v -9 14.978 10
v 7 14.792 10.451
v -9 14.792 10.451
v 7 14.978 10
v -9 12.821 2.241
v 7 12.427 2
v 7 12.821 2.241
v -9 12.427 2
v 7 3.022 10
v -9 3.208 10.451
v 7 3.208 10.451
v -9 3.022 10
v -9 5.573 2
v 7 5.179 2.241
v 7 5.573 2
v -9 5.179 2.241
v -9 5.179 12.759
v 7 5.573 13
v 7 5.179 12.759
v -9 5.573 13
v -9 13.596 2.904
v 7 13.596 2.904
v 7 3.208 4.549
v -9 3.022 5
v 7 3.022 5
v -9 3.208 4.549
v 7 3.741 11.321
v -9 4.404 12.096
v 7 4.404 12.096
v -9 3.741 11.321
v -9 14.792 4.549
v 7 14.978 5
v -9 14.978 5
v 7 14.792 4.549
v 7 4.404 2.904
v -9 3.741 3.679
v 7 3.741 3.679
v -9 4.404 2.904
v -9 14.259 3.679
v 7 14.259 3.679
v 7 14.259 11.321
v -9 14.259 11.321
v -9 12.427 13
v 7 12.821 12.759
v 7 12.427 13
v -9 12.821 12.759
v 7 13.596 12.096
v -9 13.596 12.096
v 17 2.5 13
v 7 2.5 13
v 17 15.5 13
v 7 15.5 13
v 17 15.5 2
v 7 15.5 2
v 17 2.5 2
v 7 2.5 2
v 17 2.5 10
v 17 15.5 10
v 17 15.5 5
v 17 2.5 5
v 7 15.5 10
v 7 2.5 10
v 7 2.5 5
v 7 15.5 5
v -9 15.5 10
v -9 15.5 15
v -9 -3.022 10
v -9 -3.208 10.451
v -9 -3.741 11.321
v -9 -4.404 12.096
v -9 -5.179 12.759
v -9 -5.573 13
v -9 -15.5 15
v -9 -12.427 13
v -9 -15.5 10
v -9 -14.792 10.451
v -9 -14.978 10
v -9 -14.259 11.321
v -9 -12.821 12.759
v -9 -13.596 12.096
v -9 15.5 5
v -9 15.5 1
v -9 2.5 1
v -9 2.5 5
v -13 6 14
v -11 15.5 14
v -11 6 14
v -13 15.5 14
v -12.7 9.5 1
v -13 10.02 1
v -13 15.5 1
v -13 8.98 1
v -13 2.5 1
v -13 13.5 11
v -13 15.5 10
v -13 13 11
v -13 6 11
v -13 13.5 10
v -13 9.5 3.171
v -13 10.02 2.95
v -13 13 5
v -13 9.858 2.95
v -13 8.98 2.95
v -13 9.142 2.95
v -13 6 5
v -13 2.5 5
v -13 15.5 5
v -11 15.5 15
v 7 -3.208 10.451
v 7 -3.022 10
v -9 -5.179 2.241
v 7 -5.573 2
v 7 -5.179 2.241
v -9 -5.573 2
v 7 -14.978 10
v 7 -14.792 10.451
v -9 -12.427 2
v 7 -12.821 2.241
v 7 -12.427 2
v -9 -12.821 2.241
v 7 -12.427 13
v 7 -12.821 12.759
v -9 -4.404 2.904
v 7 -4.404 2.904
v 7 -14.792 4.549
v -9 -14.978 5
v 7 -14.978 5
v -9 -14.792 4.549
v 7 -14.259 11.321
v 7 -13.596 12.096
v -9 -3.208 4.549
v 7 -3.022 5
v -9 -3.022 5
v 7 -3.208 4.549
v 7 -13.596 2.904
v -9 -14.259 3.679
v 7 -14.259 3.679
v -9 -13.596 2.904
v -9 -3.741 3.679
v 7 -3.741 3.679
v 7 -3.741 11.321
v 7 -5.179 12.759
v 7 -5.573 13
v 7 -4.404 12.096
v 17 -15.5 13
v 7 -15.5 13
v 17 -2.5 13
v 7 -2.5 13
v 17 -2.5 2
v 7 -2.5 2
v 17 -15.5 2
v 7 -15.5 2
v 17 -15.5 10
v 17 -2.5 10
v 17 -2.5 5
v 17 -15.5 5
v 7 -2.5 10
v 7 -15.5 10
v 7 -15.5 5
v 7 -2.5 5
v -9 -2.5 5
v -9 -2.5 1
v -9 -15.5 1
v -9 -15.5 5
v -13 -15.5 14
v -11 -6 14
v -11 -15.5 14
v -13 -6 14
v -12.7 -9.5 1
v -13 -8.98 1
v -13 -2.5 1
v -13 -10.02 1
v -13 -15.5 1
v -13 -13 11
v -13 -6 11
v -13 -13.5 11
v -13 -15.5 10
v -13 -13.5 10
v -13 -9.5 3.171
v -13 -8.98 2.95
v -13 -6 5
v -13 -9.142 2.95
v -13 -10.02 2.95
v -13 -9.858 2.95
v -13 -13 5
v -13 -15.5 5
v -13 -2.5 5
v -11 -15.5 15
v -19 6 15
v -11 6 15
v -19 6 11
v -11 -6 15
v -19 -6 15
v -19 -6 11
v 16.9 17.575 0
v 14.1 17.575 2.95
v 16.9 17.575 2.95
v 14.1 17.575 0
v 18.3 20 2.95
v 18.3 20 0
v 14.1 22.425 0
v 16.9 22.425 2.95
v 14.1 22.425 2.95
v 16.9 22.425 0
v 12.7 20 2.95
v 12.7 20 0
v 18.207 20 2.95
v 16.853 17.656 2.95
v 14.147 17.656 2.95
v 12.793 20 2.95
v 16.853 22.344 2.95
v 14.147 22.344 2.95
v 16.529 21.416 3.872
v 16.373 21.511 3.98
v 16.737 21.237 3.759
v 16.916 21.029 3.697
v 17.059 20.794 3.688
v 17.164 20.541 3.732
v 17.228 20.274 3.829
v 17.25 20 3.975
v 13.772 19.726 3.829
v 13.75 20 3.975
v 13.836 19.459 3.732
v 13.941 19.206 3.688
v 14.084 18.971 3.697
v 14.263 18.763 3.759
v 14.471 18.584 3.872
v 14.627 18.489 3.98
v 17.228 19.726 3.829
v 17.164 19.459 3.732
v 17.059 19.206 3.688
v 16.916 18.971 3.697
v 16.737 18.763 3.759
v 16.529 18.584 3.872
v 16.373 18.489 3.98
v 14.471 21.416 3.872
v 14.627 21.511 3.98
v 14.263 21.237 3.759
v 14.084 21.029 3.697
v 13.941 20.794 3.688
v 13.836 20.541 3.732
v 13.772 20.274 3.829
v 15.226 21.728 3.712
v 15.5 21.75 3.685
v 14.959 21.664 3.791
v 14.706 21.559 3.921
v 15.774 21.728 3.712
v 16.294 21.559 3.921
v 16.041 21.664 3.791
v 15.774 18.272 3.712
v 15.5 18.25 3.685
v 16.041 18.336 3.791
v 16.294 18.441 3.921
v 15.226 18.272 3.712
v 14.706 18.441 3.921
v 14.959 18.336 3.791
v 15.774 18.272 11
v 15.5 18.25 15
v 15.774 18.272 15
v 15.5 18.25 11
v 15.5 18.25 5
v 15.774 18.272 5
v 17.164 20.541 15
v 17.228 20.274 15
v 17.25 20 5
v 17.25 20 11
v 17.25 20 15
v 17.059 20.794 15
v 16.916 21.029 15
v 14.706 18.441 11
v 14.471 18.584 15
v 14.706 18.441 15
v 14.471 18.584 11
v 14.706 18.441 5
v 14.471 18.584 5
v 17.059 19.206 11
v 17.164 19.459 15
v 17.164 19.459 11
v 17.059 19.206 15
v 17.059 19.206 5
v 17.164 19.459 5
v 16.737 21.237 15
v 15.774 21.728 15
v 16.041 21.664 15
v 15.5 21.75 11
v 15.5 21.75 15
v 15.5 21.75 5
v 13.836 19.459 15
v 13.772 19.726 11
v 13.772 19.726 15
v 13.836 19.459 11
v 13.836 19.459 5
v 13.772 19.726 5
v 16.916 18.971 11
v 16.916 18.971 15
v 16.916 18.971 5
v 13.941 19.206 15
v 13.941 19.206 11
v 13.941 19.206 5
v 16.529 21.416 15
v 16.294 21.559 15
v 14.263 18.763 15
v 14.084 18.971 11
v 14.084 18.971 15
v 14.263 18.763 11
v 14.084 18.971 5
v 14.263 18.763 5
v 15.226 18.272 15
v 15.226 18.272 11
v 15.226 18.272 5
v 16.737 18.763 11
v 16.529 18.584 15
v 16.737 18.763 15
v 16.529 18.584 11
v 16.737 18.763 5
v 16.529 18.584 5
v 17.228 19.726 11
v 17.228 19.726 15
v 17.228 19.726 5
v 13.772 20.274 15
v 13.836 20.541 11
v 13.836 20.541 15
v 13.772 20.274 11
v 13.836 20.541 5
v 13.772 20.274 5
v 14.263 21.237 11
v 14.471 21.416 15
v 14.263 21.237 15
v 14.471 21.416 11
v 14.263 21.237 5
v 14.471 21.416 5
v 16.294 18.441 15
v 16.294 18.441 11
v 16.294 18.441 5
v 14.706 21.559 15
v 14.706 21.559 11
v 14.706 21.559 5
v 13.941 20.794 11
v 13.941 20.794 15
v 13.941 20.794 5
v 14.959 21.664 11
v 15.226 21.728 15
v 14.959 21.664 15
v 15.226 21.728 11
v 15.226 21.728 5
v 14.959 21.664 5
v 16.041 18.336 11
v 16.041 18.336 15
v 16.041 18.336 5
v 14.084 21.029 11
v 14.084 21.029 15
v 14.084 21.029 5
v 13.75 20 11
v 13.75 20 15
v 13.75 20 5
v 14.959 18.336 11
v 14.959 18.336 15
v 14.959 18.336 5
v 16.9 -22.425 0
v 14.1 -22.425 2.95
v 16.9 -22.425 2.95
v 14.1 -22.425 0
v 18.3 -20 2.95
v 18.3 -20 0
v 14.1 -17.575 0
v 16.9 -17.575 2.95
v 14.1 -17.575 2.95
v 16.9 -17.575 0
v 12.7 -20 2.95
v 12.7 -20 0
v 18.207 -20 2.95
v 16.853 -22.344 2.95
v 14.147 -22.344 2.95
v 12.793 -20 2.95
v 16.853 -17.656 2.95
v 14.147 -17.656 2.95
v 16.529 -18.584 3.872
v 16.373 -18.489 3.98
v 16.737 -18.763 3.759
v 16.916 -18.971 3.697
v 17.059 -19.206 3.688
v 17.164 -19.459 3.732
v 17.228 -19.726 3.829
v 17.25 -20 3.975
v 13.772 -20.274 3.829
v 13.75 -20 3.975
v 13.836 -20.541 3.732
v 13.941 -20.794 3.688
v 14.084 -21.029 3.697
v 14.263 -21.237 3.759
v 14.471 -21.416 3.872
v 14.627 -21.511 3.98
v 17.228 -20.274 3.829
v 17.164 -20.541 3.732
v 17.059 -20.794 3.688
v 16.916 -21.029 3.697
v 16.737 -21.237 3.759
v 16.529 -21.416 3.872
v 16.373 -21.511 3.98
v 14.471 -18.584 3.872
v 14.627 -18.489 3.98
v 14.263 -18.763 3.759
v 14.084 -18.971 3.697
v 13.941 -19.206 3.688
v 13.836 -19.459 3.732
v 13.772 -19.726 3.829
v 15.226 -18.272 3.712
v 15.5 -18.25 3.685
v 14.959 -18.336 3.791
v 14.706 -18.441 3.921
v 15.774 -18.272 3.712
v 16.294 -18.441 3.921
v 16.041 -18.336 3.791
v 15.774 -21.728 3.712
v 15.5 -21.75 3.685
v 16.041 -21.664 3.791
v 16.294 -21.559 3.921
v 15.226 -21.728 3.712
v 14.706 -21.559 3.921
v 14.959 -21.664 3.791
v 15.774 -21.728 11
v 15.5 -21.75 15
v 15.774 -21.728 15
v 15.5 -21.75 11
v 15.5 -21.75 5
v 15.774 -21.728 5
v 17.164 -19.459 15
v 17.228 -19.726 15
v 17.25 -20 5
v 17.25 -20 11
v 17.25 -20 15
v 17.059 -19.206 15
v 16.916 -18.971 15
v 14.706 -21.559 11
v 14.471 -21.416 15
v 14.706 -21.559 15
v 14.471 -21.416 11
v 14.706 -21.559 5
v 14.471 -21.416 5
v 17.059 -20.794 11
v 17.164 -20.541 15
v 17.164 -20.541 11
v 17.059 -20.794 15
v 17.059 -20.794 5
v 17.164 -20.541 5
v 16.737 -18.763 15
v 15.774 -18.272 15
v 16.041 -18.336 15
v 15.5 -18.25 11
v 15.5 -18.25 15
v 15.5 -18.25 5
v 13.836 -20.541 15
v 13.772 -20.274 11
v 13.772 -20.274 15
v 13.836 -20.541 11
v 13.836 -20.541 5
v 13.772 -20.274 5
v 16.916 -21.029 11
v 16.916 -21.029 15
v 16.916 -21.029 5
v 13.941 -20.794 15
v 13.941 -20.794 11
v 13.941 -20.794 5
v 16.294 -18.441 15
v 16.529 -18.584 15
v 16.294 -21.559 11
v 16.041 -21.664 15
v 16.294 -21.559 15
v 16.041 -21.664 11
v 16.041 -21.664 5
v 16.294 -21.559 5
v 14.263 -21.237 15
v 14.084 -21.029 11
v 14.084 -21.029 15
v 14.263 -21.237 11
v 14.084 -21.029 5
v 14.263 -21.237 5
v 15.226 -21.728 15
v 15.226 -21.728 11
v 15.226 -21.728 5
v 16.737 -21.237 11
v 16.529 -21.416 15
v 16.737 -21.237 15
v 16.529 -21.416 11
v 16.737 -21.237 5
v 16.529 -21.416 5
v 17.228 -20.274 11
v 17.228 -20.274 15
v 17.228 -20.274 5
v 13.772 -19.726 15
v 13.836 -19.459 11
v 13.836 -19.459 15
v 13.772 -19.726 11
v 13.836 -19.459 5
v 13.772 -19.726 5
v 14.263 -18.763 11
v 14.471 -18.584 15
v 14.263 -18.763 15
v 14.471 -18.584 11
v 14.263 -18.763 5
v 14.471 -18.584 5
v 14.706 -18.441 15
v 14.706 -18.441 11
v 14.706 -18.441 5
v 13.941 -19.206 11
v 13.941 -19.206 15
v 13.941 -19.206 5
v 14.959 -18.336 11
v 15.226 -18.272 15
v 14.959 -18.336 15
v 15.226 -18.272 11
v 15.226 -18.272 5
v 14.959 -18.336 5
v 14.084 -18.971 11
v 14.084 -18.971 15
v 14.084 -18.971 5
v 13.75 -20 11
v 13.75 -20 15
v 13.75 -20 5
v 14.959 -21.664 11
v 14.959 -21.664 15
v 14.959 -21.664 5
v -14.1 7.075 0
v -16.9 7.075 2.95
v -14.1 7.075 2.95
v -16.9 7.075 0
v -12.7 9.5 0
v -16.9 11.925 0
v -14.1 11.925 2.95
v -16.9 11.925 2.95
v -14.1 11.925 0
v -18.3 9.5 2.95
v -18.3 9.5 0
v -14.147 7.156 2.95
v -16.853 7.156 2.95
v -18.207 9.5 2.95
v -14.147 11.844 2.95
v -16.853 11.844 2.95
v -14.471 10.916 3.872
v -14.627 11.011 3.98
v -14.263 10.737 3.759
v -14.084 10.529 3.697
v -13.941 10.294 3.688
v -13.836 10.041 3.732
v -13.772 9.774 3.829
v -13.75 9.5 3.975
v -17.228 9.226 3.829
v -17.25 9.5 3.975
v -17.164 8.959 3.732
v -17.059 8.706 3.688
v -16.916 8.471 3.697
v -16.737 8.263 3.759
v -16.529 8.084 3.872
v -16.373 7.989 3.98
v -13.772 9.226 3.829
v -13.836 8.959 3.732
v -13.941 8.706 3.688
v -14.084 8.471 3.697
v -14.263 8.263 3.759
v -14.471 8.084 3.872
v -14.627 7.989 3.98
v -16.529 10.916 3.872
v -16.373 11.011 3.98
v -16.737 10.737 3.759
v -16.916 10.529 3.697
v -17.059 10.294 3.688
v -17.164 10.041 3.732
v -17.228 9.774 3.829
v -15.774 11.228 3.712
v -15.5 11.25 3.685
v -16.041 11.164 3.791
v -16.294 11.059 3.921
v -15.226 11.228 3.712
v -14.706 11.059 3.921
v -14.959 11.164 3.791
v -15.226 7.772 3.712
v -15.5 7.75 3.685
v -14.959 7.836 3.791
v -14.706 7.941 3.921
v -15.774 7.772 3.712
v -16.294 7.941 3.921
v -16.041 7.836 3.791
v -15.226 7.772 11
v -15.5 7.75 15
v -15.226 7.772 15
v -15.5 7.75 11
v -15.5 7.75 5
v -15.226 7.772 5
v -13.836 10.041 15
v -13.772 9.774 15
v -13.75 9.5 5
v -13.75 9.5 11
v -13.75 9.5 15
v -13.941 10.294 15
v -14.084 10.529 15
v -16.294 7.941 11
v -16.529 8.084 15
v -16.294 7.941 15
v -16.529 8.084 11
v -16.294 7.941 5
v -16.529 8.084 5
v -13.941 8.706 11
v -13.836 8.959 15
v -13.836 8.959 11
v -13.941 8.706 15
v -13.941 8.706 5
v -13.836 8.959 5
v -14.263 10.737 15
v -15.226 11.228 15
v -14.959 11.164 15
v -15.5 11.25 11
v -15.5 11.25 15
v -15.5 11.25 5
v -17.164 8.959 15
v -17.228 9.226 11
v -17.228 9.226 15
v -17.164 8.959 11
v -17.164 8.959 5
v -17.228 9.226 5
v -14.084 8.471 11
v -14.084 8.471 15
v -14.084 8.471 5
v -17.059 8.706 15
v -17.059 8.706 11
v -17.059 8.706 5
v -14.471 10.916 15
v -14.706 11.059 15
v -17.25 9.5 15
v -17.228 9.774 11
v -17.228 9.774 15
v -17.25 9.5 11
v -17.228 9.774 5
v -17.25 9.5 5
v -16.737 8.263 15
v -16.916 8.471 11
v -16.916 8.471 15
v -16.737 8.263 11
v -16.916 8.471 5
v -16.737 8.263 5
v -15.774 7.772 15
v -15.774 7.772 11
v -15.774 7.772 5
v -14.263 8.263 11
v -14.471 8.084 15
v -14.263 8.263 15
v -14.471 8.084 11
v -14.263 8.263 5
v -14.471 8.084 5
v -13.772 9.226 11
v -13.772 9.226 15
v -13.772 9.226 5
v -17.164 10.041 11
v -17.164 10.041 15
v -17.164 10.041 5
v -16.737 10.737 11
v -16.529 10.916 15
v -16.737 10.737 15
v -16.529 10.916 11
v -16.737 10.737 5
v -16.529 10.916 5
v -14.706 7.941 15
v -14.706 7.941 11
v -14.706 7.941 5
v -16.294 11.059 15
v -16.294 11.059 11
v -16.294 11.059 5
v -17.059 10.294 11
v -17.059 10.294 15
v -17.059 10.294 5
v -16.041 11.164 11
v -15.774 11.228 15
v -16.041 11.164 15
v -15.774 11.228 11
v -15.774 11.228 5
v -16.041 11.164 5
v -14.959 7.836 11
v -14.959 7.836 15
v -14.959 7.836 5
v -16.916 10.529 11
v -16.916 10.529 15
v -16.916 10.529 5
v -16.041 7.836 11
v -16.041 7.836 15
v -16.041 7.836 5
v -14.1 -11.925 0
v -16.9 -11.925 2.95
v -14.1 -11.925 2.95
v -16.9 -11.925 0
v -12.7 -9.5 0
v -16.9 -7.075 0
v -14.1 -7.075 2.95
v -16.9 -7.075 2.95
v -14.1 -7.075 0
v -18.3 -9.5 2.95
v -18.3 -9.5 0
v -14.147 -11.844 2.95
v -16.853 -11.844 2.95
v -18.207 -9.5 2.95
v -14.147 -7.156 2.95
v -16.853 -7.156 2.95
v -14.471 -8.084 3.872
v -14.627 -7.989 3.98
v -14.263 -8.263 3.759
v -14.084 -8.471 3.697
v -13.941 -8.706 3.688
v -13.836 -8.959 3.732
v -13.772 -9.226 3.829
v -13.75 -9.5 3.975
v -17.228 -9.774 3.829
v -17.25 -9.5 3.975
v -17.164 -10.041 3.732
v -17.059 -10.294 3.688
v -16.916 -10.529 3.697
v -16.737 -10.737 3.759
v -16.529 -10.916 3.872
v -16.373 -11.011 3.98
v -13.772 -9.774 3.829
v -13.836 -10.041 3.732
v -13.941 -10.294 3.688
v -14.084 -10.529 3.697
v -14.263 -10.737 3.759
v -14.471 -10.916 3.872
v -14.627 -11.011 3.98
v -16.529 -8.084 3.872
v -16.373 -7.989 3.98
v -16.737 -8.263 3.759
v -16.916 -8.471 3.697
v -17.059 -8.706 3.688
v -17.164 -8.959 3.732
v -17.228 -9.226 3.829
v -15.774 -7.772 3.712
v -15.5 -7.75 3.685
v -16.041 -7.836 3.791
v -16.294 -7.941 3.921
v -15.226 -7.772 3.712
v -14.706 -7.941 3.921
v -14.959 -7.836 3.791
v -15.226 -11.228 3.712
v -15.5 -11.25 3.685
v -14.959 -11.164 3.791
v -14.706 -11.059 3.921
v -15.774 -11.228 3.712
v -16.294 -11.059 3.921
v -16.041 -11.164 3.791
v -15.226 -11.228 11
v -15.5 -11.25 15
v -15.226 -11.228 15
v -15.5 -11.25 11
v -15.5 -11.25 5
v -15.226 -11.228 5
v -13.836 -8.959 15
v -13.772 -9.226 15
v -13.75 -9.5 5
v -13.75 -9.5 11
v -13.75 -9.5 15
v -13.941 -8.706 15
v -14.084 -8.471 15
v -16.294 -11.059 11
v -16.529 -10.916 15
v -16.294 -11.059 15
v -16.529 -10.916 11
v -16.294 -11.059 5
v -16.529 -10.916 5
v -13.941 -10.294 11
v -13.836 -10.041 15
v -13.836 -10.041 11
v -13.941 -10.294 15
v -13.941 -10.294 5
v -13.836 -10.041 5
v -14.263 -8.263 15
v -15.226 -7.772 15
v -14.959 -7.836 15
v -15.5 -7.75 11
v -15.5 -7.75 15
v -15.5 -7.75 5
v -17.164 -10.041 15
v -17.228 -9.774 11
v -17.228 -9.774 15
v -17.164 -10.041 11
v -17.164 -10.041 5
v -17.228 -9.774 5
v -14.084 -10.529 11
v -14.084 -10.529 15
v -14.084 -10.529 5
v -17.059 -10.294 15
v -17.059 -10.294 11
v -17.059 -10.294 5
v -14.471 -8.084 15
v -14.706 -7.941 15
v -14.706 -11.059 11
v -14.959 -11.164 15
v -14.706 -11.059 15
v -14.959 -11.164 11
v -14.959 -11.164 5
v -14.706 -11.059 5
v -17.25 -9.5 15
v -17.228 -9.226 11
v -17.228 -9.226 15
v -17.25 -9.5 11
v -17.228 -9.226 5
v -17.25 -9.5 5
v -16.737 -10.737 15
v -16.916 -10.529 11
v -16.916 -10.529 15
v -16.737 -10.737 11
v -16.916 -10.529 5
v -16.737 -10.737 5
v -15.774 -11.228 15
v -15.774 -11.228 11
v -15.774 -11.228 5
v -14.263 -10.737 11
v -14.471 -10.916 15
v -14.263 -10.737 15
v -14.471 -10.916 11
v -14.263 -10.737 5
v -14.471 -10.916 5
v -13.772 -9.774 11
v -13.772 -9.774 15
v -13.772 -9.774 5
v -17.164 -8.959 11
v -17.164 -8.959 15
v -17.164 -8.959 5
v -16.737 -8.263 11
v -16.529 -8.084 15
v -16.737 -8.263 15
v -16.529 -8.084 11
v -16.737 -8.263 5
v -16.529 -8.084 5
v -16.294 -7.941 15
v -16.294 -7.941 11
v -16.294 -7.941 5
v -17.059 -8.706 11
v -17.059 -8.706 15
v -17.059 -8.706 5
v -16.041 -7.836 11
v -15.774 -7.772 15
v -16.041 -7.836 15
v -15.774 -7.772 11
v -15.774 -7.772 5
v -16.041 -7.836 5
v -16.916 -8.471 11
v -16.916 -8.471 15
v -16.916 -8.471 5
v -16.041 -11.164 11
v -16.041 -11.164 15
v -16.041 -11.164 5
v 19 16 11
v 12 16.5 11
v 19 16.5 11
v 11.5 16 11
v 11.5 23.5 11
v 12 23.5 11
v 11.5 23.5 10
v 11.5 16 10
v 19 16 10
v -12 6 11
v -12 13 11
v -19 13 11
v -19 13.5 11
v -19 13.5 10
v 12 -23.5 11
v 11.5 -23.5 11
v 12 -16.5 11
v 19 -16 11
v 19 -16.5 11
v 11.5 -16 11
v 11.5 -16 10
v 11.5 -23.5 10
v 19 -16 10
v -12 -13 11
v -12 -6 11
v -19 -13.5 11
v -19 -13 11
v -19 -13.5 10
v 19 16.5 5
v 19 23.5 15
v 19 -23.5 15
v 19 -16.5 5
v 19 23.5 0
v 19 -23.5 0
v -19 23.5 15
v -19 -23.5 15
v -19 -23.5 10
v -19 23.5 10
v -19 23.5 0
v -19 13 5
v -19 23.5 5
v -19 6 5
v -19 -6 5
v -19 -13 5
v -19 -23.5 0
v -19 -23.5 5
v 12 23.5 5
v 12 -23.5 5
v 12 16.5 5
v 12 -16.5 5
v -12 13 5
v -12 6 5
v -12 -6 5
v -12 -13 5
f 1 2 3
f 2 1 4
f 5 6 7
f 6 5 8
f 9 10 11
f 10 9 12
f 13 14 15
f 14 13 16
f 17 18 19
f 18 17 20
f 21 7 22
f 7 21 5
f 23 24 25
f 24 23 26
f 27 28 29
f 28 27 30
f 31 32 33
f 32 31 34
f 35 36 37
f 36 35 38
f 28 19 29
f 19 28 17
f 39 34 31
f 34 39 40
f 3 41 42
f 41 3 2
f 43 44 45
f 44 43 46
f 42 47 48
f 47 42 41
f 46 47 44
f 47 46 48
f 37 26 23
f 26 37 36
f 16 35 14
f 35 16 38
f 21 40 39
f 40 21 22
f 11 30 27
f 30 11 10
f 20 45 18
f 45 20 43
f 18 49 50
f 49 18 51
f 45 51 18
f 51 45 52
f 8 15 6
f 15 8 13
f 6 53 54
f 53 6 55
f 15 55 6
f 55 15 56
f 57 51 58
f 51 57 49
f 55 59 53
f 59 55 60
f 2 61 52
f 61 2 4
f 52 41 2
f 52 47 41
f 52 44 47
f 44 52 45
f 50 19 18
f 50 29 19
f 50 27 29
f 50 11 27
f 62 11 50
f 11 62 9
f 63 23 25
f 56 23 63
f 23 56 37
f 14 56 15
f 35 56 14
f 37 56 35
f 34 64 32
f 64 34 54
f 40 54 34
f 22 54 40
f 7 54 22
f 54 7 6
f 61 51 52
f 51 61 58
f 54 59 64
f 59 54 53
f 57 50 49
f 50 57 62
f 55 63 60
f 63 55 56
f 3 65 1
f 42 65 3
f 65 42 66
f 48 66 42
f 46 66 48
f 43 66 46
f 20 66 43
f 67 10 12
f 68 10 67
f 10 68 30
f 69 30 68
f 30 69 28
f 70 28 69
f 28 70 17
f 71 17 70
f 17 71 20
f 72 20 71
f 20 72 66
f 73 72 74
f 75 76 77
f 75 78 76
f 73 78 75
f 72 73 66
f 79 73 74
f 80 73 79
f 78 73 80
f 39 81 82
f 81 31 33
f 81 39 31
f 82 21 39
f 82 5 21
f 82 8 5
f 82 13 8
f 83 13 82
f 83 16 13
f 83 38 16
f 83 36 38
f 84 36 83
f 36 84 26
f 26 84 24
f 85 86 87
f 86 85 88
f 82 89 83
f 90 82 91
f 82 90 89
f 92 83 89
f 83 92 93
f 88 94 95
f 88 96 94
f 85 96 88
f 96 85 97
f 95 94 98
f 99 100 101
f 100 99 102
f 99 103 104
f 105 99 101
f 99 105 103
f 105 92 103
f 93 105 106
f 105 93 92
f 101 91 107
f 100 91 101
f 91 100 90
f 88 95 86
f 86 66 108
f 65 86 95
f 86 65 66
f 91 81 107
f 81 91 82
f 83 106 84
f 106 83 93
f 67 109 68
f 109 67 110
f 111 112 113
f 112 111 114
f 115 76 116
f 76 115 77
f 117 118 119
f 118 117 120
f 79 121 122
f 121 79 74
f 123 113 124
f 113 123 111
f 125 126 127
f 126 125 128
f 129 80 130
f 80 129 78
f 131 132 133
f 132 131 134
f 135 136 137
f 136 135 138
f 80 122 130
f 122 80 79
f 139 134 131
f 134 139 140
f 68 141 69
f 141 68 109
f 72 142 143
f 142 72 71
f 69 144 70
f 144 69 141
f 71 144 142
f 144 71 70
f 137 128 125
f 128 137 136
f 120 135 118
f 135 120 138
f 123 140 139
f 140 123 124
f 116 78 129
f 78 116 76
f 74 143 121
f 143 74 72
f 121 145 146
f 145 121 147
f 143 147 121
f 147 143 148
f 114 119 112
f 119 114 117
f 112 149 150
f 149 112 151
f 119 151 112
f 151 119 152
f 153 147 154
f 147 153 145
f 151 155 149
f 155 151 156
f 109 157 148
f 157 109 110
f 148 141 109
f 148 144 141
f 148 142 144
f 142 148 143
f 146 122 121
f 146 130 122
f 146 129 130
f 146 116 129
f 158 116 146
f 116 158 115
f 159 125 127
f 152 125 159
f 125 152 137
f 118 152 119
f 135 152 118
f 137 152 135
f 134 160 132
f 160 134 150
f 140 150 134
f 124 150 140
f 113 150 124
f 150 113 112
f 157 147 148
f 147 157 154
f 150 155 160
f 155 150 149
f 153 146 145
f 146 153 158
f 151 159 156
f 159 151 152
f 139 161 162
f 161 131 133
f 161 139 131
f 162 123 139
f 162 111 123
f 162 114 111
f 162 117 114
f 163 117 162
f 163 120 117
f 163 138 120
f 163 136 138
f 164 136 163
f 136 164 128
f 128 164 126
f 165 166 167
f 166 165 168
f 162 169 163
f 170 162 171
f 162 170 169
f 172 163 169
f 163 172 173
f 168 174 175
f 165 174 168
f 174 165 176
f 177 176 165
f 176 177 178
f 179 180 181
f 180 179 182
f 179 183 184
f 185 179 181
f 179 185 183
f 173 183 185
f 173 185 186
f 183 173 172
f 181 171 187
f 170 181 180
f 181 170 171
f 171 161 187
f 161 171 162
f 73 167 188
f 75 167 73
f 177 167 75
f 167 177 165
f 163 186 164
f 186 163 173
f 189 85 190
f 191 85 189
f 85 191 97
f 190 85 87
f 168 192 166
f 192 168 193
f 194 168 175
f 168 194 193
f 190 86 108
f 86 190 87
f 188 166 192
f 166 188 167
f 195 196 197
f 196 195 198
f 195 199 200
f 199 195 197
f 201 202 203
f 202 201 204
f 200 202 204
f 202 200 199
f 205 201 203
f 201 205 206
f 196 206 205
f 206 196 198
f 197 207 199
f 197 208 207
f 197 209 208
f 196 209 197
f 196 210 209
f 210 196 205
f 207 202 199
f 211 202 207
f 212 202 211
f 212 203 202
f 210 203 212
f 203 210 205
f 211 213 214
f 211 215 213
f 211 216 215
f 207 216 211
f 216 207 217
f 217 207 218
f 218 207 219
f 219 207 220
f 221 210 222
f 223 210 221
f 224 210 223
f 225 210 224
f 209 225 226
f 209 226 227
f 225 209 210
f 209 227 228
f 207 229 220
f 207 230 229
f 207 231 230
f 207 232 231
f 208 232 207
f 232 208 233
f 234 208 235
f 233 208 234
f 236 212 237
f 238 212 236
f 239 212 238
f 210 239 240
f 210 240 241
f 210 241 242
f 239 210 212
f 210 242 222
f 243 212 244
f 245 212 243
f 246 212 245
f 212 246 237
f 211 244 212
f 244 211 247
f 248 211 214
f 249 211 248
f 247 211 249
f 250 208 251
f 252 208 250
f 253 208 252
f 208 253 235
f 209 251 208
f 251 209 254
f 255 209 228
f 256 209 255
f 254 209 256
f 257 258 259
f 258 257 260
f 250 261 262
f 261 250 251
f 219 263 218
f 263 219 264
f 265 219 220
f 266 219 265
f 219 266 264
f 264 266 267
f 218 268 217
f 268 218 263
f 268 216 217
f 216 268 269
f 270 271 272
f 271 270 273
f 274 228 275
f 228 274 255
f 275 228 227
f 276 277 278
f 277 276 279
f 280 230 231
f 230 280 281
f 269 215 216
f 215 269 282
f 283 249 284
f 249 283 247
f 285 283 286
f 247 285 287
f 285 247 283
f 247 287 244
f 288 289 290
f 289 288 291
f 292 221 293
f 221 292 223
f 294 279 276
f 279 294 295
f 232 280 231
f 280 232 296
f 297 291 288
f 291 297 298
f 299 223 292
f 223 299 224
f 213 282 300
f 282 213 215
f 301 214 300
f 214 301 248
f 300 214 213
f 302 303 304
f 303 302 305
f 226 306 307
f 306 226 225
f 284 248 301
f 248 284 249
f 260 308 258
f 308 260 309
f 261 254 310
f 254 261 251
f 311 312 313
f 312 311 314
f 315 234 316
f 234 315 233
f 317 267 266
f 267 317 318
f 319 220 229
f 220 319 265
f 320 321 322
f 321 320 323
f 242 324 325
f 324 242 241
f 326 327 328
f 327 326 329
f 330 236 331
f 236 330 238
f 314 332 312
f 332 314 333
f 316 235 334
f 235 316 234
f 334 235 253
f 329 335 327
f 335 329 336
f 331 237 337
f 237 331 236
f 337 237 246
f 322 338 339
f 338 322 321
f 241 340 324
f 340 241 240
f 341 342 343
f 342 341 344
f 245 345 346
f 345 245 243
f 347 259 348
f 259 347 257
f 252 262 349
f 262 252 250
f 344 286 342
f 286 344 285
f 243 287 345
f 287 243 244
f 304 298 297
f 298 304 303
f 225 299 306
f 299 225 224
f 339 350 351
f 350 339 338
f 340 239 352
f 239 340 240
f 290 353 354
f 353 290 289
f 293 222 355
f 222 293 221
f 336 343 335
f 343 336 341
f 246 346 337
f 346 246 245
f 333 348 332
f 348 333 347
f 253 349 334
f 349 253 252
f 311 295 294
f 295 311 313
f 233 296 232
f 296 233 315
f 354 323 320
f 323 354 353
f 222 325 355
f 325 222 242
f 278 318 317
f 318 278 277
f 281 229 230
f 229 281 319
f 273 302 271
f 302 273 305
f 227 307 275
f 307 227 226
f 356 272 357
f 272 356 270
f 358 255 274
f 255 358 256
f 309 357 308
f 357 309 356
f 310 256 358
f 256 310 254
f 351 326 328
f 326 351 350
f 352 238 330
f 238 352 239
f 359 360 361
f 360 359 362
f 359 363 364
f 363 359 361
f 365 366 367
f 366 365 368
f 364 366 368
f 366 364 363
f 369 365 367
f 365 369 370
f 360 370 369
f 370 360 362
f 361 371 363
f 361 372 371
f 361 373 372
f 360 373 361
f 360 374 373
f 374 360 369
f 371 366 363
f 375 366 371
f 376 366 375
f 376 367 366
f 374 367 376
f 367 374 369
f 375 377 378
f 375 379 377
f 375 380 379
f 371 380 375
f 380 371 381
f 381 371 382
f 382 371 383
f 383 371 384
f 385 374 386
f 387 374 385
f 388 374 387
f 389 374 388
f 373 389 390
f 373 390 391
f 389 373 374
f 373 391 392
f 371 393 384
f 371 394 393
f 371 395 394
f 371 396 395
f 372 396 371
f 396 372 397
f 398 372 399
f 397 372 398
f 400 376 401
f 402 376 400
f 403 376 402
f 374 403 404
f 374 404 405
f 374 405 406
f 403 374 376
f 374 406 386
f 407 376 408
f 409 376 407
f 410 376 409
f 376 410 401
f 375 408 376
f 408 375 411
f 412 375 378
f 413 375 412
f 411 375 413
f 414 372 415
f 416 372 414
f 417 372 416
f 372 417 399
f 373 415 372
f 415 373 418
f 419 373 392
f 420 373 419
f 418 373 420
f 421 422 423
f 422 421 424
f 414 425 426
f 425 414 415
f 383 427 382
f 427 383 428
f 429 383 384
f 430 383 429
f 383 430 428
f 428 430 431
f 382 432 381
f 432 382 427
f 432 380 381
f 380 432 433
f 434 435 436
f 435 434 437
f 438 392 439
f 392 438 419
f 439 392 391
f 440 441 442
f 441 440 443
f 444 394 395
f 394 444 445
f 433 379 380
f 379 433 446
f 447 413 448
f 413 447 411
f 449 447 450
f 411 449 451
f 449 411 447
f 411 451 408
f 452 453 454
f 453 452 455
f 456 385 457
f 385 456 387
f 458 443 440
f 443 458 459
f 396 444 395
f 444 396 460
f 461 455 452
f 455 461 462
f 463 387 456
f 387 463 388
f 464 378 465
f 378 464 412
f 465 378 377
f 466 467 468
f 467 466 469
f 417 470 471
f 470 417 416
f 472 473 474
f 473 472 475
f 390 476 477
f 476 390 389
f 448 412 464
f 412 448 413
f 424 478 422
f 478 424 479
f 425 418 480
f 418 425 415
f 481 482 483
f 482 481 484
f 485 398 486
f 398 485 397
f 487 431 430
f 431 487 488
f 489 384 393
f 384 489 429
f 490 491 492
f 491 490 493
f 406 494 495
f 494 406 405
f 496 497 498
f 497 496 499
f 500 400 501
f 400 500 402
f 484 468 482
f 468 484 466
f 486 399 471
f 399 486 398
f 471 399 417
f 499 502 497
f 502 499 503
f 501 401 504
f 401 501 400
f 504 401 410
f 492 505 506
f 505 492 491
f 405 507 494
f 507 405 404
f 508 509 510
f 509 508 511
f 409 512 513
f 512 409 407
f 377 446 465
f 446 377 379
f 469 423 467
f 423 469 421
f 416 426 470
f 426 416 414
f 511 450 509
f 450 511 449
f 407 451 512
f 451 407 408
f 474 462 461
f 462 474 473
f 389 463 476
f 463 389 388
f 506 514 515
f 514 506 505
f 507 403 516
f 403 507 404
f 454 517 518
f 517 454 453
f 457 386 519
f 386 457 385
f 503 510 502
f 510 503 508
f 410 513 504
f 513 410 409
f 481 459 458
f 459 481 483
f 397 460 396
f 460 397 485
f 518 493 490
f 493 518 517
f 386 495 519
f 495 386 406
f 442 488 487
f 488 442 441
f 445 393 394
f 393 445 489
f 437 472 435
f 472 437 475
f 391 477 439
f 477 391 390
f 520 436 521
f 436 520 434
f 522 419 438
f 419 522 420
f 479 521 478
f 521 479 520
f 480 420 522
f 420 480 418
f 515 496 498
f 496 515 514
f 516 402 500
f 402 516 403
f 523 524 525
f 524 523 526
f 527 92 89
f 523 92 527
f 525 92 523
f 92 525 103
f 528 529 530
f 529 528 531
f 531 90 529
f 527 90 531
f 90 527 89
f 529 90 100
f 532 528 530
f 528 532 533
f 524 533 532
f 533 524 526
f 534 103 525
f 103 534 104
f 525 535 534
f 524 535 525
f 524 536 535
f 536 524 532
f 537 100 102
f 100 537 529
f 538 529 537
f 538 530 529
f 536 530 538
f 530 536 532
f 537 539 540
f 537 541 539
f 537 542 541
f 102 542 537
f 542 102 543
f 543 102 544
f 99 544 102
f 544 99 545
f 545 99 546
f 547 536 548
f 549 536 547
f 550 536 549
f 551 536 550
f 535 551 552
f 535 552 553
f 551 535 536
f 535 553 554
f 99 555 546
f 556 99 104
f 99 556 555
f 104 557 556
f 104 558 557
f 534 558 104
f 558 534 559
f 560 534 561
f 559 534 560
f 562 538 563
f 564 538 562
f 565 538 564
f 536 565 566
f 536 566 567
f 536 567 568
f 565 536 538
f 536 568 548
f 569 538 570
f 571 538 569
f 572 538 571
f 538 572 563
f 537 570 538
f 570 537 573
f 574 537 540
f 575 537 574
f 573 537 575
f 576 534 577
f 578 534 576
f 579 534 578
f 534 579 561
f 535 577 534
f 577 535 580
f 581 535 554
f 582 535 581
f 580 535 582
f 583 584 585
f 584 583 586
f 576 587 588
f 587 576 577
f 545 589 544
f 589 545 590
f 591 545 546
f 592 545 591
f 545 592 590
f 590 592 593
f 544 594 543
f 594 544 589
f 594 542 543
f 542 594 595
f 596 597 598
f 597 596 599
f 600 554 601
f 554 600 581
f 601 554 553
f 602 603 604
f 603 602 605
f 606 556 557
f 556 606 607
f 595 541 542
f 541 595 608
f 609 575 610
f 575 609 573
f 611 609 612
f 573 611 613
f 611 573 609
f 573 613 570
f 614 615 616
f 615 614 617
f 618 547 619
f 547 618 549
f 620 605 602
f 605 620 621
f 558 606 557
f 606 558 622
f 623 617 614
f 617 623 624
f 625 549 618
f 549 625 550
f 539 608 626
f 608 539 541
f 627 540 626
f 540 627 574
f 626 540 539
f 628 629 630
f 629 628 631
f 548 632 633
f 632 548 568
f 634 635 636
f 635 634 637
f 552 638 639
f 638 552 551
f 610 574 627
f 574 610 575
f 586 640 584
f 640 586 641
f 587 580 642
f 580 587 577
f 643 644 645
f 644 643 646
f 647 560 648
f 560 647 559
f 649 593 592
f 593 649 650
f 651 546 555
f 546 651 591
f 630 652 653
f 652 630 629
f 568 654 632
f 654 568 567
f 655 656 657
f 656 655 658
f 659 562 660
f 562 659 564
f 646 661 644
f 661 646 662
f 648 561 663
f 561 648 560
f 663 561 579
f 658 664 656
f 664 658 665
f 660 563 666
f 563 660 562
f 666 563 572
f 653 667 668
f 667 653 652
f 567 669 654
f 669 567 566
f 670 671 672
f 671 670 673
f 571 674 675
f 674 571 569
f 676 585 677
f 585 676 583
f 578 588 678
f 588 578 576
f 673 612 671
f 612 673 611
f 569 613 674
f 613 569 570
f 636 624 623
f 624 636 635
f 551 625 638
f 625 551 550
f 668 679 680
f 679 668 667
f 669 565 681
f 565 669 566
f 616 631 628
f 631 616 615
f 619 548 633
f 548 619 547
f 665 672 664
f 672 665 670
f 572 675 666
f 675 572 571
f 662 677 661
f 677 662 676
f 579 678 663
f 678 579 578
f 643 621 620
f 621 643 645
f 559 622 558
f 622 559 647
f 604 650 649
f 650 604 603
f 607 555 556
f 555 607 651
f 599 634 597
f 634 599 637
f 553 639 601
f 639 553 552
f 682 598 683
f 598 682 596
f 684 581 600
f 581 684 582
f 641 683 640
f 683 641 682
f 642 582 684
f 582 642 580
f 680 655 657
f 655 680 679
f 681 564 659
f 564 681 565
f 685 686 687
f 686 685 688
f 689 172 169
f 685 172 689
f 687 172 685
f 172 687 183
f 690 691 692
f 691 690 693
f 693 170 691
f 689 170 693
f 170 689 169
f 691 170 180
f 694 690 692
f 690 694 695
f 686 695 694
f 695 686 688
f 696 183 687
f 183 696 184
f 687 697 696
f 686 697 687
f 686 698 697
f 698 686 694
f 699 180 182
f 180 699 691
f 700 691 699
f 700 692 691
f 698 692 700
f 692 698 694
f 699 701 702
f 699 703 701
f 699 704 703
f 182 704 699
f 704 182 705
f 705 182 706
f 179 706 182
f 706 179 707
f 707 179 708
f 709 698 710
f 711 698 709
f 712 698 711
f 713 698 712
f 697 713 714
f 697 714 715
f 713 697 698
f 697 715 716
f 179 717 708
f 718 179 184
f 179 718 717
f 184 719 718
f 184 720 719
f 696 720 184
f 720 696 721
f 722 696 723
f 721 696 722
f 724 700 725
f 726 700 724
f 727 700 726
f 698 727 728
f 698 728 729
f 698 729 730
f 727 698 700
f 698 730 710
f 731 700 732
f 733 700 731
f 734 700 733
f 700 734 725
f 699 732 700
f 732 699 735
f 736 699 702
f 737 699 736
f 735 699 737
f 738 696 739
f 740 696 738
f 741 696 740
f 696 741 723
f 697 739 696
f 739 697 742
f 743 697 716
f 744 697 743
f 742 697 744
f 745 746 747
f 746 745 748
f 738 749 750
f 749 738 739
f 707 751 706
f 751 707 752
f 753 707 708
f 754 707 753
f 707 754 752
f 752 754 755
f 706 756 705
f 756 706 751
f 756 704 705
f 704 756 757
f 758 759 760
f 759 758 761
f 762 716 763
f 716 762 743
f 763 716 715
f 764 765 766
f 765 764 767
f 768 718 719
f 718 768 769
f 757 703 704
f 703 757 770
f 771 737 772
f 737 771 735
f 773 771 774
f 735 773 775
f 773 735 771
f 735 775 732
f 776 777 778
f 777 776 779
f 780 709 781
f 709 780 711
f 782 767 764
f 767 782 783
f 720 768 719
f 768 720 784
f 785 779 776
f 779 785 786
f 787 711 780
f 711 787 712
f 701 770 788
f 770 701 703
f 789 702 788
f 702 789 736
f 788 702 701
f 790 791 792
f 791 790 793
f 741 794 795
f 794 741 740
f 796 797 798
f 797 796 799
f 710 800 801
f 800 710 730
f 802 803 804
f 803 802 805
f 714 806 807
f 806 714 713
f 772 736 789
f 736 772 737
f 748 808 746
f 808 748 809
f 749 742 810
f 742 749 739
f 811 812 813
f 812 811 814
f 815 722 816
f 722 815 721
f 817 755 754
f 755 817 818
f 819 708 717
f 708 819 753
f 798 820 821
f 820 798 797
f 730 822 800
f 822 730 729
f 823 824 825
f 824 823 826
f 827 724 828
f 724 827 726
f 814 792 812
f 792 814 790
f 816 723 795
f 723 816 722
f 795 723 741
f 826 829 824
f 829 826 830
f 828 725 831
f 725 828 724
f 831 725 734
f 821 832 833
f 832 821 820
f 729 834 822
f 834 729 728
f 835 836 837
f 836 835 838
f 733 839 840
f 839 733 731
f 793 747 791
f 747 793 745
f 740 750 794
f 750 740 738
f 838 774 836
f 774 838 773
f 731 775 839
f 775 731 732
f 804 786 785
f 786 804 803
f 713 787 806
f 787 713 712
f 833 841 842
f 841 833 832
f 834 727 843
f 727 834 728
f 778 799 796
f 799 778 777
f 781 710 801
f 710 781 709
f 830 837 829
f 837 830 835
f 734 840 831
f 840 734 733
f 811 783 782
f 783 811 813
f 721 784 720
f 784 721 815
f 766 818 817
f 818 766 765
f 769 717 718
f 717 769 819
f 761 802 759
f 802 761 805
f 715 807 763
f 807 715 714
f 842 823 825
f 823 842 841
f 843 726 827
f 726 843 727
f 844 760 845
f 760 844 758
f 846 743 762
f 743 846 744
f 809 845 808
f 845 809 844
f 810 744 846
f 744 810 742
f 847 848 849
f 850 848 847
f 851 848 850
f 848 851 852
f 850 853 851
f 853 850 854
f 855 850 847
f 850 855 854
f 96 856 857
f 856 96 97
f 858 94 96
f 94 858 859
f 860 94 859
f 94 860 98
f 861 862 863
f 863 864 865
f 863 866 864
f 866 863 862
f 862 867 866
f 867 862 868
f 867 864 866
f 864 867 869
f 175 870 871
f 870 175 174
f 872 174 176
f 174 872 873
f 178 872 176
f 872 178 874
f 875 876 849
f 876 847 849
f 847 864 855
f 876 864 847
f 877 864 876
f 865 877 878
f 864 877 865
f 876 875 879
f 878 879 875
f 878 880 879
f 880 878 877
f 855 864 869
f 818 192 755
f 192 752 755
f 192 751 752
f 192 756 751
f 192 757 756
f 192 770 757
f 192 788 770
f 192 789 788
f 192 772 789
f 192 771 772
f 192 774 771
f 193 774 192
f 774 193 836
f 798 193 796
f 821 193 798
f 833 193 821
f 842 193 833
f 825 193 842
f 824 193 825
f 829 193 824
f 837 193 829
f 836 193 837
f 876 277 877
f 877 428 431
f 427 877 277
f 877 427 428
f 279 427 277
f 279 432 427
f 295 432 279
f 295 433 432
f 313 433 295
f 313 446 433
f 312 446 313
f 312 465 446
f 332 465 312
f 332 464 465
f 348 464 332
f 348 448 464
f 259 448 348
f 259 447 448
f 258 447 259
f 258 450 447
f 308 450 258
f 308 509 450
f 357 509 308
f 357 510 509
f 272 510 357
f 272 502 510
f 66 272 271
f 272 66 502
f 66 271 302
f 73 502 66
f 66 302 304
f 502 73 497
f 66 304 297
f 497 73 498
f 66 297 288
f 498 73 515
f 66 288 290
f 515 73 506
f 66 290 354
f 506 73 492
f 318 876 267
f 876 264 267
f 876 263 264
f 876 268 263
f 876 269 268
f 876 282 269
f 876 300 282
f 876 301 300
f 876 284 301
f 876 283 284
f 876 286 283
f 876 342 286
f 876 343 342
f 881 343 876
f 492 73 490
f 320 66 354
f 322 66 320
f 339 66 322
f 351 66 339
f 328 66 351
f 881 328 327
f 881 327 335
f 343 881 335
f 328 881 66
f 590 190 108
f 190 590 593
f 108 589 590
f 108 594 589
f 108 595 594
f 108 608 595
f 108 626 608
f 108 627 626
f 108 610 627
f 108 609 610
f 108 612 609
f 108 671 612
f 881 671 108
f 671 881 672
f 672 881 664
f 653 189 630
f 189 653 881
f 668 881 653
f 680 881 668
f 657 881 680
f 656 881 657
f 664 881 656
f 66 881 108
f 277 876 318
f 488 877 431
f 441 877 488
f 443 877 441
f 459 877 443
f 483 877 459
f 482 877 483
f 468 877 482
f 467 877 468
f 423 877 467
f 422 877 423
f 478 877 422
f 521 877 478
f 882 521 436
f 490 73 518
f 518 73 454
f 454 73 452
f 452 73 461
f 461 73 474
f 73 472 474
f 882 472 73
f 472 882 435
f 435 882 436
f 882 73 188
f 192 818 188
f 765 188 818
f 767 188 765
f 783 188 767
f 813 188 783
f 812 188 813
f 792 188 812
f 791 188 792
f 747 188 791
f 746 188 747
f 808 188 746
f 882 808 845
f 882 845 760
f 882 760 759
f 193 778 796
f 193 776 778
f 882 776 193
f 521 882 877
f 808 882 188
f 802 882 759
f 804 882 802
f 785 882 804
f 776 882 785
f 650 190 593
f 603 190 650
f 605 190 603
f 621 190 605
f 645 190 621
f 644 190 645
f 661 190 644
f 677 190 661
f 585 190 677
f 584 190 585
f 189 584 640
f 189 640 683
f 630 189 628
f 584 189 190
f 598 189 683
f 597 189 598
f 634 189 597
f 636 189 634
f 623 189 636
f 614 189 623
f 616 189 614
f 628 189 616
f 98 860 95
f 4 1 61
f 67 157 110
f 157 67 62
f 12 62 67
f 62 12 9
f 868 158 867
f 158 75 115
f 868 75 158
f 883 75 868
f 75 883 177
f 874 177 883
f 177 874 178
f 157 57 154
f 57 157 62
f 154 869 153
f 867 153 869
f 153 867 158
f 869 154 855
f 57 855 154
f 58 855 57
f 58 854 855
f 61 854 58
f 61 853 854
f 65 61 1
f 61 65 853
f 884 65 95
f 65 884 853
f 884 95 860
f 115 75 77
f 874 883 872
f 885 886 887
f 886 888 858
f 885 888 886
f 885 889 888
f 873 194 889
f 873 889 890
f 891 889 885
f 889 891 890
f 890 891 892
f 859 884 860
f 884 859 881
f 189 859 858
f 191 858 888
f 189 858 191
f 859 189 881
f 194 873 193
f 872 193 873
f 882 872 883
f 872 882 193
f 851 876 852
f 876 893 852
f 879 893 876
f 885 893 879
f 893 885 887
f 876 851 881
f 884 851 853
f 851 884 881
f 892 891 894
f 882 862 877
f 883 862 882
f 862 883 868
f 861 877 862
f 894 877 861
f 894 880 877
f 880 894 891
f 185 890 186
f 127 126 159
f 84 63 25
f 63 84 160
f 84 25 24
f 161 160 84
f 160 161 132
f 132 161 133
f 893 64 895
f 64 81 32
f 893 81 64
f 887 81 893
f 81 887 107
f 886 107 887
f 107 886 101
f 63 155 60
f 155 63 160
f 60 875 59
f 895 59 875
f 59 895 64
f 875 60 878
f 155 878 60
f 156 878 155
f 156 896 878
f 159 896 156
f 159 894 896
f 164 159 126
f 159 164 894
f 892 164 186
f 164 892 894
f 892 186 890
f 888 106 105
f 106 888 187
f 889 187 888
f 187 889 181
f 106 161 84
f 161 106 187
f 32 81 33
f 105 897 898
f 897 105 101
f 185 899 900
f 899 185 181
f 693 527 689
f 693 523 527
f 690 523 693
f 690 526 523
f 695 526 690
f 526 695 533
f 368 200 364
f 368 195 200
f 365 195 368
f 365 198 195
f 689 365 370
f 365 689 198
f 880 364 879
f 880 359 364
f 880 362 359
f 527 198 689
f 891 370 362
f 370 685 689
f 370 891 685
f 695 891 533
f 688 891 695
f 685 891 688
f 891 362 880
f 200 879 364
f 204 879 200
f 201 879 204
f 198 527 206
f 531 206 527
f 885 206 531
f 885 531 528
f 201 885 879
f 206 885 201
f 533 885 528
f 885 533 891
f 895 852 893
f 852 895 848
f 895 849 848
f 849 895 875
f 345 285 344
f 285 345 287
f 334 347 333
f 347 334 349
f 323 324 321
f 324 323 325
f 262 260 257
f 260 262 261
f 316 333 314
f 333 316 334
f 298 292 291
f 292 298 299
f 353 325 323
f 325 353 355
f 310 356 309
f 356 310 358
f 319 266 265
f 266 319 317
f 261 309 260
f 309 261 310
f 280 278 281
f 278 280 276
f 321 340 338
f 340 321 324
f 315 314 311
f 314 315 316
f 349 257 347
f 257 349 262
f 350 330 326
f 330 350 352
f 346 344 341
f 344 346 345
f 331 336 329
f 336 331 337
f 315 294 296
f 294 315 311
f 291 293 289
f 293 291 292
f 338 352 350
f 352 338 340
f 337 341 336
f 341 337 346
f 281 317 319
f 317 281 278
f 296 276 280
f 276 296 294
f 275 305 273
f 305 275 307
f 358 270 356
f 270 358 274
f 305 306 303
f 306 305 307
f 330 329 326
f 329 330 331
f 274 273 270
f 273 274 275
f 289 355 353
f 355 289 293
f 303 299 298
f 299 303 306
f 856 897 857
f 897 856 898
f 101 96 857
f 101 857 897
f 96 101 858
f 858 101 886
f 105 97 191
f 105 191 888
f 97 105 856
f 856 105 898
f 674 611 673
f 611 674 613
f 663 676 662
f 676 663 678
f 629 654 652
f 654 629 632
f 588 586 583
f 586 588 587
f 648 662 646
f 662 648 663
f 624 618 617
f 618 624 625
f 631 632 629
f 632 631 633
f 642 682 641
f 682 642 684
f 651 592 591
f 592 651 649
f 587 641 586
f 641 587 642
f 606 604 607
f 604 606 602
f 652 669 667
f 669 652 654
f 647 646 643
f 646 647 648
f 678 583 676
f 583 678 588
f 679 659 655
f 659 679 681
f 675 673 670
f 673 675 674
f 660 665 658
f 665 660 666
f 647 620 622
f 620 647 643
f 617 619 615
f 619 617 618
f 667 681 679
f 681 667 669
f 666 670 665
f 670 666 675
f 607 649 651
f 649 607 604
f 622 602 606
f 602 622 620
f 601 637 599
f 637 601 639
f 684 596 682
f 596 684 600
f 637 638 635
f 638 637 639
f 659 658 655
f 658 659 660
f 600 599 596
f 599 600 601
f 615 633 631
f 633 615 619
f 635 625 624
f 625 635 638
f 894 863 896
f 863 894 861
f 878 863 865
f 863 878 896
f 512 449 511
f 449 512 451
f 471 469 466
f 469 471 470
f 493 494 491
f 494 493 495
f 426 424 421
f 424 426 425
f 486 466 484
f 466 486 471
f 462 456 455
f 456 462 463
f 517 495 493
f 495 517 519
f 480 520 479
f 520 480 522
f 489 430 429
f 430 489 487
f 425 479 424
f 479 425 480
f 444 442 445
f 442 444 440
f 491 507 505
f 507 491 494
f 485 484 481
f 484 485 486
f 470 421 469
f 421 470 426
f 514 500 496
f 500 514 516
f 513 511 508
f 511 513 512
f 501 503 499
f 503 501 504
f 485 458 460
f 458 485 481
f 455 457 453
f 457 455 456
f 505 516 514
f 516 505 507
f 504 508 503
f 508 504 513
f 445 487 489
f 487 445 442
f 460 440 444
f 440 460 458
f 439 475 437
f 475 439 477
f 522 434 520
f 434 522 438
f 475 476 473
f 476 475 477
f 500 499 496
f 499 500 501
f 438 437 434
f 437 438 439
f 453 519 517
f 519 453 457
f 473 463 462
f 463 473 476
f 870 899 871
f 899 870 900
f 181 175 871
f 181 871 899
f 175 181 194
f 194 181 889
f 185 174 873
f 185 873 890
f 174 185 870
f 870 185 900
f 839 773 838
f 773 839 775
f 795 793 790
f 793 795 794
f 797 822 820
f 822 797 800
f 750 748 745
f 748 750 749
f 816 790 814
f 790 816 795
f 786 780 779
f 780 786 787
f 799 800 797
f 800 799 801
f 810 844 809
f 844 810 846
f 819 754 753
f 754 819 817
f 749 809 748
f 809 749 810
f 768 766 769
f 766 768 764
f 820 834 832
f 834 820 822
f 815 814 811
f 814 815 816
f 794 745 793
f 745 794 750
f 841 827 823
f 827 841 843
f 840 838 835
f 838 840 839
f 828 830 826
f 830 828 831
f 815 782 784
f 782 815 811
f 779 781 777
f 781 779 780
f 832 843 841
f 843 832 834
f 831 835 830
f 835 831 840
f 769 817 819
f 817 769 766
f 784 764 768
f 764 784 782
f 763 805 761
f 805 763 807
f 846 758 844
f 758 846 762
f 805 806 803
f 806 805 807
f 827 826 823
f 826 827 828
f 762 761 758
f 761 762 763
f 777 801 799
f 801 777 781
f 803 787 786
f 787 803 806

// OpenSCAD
// file: motor.scad
//rotate([0,-90,0]){
//
	//motor(false);
//}
extraMotorSize =1;
N20MotorHeight = 10 + extraMotorSize;
N20MotorWidth = 12 + extraMotorSize;
N20MotorPartLenght = 15 + extraMotorSize;
N20GearPartLenght = 9 + extraMotorSize;


//extraMotorSize = extra size when using as hole
//wireSpaceLenght = lenght of the space for wires behind motor
//placeForVires = if true there are place for wires... othervise not
//wallRemower =  parameter to remove thin walls if using as a hole 
//						set to zero if you want to print the motor

module motor(placeForVires = true, wireSpaceLenght = 5, 
				 wallRemover = 0.1){

// Motor whit these mesurments
//http://i1040.photobucket.com/albums/b403/guokunli/T2Q1irXhxaXXXXXXXX_649914550_conew1.jpg



 
// width of motor
width = N20MotorWidth;
// height of motor
height = N20MotorHeight;
// lenght of the motor part
motorLenght = N20MotorPartLenght;
// lenght of the gear part
gearLenght = N20GearPartLenght;
// tickness and radius of the root of the shaft
shaftRoot = 1;
shaftRootR = 2;
// lenght height and widt of the shaft
shaftLenght = 10;
shaftHeight = 2.5;
shaftWidth = 3;




// $fn value for cylinders
fn = 40;

// some calvculated parameters for easier use
radiusW = width/2;
radiusH = height/2;
motorWhitoutShaftL = motorLenght+gearLenght+shaftRoot;

if (placeForVires){
	//place for wires
	translate([-wireSpaceLenght,-radiusW,-radiusW]){
		cube([wireSpaceLenght, width, width]);
	}
}
 
// motor part

intersection(){
	rotate([90,0,90])translate([0,0, -wallRemover]){
		cylinder(motorLenght+2*wallRemover,radiusW, radiusW, $fn = fn);
	}
	translate([-wallRemover, -radiusW, -radiusH]){	
		cube([motorLenght+2*wallRemover, width, height]);
	}
}

//gear part

translate([motorLenght,-radiusW,-radiusH]){
	cube([gearLenght, width, height]);
   translate([gearLenght, radiusW, radiusH])rotate([0,90,0]){
		cylinder(shaftRoot, shaftRootR, shaftRootR, $fn = fn);
	}   

}

// shaft

translate([motorWhitoutShaftL, 0, 0]){
	intersection(){
		translate([0, -shaftWidth/2, -shaftWidth/2]){
			cube([shaftLenght, shaftWidth, shaftHeight]);
		}
		rotate([0,90,0]){
			cylinder(shaftLenght, shaftWidth/2, shaftWidth/2, $fn = fn);
		}
	}
}

}
// main file
// TODO add screwsupport to motorbayTar and

include<motor.scad>;

motorWidth = N20MotorWidth ;
motorHeight = N20MotorHeight;
motorLenght = N20MotorPartLenght+ N20GearPartLenght;
motorFromFront =2;


// measurments of the motorboard
boardLenght = 28;
boardWidth = 28;
boardHeight = 15;





// lengts of the bay for the board
boardBayLenght = 30;
boardBayWidth = 35;
boardBayHeight = boardHeight;
boardBayScrewSpacing = 19;


// motorbay measurments
width = 47;
lenght = 38;
bottomThickness = 5;
topTickness = 5;
motorSpacing = 5;
// motorbayHeight
height = 15;

wireHoleWidth = 12;
wireHoleLenght = 13;
wireHoleHeight = topTickness +1;
wireSpringWidth = 2;
motorWireSpaceLenght = 4;

// screw and support measurments
screwHoleR = 1.75;
hexaR = 5.6/2;
hexaHeight = 3;
supportSize = screwHoleR*4;
supportInTop = 1;
extraSizeinSupportHole = 1;
screwFromS = 2*screwHoleR;
screwLenght = height+2;




// code that shows all parts), and whit the printable arts transparent
// bottom
//motorbayOverview();


// modules whit only the printed parts AT RIGHT PLACE
topMotorBay();
bottomMotorBay();


// printable code
//motorbayTray();


module motorbayOverview(){
	translate([-lenght/2, -width/2, 0]){
		%cube([lenght, width, bottomThickness]);
	}
	// top
	translate([-lenght/2, -width/2, height-topTickness]){
		%cube([lenght, width, topTickness]);
	}
	motorPlace();
	screwHoles();
	%screwSupportAtPlace(0);
}


module motorbayTray(){
	translate([width/2,0, height])rotate([180,0,0]){
		topMotorBay();
	}
	translate([-width/2,0,0]){
		bottomMotorBay();
	}
}



module topMotorBay(){
	difference(){
		translate([-lenght/2, -width/2, height-topTickness]){
			cube([lenght, width, topTickness]);
		}
      motorPlace();
      screwHoles();	
	screwSupportAtPlace(extraSizeinSupportHole);	
	
	}

}

module bottomMotorBay(){
	difference(){
		translate([-lenght/2, -width/2, 0]){
			cube([lenght, width, bottomThickness]);
		}
      motorPlace();
      screwHoles();		
	}
   screwSupportAtPlace();
}





// screwholes for motorbay
module screwHoles(){
	translate([lenght/2-screwFromS ,width/2-screwFromS , 0]){
		screwHole();
		hexa();
	}
	translate([lenght/2-screwFromS ,-(width/2-screwFromS ), 0]){
		screwHole();
		hexa();
	}
      boardplaceScrevs();

}



module screwSupportAtPlace(extraSize = 0){
	translate([lenght/2-supportSize-extraSize/2 ,
					width/2-supportSize-extraSize/2, 
					bottomThickness]){
  		screwSupport(extraSize);
 	}
	translate([-lenght/2-extraSize/2, (+boardBayScrewSpacing - supportSize -extraSize)/2, 
					bottomThickness]){
  		screwSupport(extraSize);
 	}
	translate([lenght/2-supportSize-extraSize/2,-width/2-extraSize/2, 
					bottomThickness]){
  		screwSupport(extraSize);
 	}
	translate([-lenght/2-extraSize/2, (-boardBayScrewSpacing - supportSize -extraSize)/2,
 bottomThickness]){
  		screwSupport(extraSize);
 	}
}

// sopport between screws
module screwSupport(extraSize = 0){
   difference(){
		cube([supportSize+extraSize,supportSize+extraSize,
				 height-bottomThickness-topTickness+supportInTop]);
		translate([(supportSize+extraSize)/2, (supportSize+extraSize)/2, 0]){
			screwHole(extraSize/2);
		}		
	}
}


module hexa(){
	wallRemover = 0.05;
	translate([0,0, -wallRemover]){
  		cylinder(hexaHeight ,hexaR ,hexaR , $fn = 6);
		// pyramid ontop of hexa
		translate([0,0, hexaHeight-2*wallRemover]){
			cylinder(hexaHeight ,hexaR ,0 , $fn = 6);
		}
	}
}

module screwHole(smallerHole = 0){
	translate([0,0, -1]){
		cylinder(screwLenght  ,screwHoleR-smallerHole  ,screwHoleR-smallerHole  , $fn = 40);
	}
}



module motorPlace(){
	// motorplaces at the end of bottom plane while bottomplan is centered
	translate([((lenght/2)-motorLenght-motorFromFront),
				motorWidth/2+ motorSpacing/2,
				(height/2)]){
		motor(wireSpaceLenght = motorWireSpaceLenght);
		
	}
	translate([((lenght/2)-motorLenght-motorFromFront),
				-motorWidth/2- motorSpacing/2,
				(height/2)]){
		motor(wireSpaceLenght = motorWireSpaceLenght);
	}
      // wireholes
 	translate([((lenght/2)-motorLenght-wireHoleLenght-motorFromFront),
				- wireHoleWidth/2,
				height-topTickness-0.5 ]){
		cube([wireHoleLenght,wireHoleWidth,wireHoleHeight ]);
	}
	translate([((lenght/2)-motorLenght-wireSpringWidth-motorFromFront),
				- (2*motorWidth + motorSpacing)/2,
				height-topTickness-0.5 ]){
		cube([wireSpringWidth, 2*motorWidth + motorSpacing,wireHoleHeight ]);
	}
	

}

//screwholes for board
module boardplaceScrevs(){
	translate([-lenght/2+screwFromS , boardBayScrewSpacing /2, 0]){
		screwHole(smallerHole = 0);
		hexa();
	}
	translate([-lenght/2+screwFromS , -boardBayScrewSpacing /2, 0]){
		screwHole(smallerHole = 0);
		hexa();
	}
}


// boardplace
//translate([-lenght/2, -boardWidth/2, height]){
//   board();  
//}
//translate([-lenght/2, -boardBayWidth/2, height]){
//   %cube([boardBayLenght, boardBayWidth, boardBayHeight]);     
//}

module board(){
	cube([boardLenght, boardWidth, boardHeight]);
}
